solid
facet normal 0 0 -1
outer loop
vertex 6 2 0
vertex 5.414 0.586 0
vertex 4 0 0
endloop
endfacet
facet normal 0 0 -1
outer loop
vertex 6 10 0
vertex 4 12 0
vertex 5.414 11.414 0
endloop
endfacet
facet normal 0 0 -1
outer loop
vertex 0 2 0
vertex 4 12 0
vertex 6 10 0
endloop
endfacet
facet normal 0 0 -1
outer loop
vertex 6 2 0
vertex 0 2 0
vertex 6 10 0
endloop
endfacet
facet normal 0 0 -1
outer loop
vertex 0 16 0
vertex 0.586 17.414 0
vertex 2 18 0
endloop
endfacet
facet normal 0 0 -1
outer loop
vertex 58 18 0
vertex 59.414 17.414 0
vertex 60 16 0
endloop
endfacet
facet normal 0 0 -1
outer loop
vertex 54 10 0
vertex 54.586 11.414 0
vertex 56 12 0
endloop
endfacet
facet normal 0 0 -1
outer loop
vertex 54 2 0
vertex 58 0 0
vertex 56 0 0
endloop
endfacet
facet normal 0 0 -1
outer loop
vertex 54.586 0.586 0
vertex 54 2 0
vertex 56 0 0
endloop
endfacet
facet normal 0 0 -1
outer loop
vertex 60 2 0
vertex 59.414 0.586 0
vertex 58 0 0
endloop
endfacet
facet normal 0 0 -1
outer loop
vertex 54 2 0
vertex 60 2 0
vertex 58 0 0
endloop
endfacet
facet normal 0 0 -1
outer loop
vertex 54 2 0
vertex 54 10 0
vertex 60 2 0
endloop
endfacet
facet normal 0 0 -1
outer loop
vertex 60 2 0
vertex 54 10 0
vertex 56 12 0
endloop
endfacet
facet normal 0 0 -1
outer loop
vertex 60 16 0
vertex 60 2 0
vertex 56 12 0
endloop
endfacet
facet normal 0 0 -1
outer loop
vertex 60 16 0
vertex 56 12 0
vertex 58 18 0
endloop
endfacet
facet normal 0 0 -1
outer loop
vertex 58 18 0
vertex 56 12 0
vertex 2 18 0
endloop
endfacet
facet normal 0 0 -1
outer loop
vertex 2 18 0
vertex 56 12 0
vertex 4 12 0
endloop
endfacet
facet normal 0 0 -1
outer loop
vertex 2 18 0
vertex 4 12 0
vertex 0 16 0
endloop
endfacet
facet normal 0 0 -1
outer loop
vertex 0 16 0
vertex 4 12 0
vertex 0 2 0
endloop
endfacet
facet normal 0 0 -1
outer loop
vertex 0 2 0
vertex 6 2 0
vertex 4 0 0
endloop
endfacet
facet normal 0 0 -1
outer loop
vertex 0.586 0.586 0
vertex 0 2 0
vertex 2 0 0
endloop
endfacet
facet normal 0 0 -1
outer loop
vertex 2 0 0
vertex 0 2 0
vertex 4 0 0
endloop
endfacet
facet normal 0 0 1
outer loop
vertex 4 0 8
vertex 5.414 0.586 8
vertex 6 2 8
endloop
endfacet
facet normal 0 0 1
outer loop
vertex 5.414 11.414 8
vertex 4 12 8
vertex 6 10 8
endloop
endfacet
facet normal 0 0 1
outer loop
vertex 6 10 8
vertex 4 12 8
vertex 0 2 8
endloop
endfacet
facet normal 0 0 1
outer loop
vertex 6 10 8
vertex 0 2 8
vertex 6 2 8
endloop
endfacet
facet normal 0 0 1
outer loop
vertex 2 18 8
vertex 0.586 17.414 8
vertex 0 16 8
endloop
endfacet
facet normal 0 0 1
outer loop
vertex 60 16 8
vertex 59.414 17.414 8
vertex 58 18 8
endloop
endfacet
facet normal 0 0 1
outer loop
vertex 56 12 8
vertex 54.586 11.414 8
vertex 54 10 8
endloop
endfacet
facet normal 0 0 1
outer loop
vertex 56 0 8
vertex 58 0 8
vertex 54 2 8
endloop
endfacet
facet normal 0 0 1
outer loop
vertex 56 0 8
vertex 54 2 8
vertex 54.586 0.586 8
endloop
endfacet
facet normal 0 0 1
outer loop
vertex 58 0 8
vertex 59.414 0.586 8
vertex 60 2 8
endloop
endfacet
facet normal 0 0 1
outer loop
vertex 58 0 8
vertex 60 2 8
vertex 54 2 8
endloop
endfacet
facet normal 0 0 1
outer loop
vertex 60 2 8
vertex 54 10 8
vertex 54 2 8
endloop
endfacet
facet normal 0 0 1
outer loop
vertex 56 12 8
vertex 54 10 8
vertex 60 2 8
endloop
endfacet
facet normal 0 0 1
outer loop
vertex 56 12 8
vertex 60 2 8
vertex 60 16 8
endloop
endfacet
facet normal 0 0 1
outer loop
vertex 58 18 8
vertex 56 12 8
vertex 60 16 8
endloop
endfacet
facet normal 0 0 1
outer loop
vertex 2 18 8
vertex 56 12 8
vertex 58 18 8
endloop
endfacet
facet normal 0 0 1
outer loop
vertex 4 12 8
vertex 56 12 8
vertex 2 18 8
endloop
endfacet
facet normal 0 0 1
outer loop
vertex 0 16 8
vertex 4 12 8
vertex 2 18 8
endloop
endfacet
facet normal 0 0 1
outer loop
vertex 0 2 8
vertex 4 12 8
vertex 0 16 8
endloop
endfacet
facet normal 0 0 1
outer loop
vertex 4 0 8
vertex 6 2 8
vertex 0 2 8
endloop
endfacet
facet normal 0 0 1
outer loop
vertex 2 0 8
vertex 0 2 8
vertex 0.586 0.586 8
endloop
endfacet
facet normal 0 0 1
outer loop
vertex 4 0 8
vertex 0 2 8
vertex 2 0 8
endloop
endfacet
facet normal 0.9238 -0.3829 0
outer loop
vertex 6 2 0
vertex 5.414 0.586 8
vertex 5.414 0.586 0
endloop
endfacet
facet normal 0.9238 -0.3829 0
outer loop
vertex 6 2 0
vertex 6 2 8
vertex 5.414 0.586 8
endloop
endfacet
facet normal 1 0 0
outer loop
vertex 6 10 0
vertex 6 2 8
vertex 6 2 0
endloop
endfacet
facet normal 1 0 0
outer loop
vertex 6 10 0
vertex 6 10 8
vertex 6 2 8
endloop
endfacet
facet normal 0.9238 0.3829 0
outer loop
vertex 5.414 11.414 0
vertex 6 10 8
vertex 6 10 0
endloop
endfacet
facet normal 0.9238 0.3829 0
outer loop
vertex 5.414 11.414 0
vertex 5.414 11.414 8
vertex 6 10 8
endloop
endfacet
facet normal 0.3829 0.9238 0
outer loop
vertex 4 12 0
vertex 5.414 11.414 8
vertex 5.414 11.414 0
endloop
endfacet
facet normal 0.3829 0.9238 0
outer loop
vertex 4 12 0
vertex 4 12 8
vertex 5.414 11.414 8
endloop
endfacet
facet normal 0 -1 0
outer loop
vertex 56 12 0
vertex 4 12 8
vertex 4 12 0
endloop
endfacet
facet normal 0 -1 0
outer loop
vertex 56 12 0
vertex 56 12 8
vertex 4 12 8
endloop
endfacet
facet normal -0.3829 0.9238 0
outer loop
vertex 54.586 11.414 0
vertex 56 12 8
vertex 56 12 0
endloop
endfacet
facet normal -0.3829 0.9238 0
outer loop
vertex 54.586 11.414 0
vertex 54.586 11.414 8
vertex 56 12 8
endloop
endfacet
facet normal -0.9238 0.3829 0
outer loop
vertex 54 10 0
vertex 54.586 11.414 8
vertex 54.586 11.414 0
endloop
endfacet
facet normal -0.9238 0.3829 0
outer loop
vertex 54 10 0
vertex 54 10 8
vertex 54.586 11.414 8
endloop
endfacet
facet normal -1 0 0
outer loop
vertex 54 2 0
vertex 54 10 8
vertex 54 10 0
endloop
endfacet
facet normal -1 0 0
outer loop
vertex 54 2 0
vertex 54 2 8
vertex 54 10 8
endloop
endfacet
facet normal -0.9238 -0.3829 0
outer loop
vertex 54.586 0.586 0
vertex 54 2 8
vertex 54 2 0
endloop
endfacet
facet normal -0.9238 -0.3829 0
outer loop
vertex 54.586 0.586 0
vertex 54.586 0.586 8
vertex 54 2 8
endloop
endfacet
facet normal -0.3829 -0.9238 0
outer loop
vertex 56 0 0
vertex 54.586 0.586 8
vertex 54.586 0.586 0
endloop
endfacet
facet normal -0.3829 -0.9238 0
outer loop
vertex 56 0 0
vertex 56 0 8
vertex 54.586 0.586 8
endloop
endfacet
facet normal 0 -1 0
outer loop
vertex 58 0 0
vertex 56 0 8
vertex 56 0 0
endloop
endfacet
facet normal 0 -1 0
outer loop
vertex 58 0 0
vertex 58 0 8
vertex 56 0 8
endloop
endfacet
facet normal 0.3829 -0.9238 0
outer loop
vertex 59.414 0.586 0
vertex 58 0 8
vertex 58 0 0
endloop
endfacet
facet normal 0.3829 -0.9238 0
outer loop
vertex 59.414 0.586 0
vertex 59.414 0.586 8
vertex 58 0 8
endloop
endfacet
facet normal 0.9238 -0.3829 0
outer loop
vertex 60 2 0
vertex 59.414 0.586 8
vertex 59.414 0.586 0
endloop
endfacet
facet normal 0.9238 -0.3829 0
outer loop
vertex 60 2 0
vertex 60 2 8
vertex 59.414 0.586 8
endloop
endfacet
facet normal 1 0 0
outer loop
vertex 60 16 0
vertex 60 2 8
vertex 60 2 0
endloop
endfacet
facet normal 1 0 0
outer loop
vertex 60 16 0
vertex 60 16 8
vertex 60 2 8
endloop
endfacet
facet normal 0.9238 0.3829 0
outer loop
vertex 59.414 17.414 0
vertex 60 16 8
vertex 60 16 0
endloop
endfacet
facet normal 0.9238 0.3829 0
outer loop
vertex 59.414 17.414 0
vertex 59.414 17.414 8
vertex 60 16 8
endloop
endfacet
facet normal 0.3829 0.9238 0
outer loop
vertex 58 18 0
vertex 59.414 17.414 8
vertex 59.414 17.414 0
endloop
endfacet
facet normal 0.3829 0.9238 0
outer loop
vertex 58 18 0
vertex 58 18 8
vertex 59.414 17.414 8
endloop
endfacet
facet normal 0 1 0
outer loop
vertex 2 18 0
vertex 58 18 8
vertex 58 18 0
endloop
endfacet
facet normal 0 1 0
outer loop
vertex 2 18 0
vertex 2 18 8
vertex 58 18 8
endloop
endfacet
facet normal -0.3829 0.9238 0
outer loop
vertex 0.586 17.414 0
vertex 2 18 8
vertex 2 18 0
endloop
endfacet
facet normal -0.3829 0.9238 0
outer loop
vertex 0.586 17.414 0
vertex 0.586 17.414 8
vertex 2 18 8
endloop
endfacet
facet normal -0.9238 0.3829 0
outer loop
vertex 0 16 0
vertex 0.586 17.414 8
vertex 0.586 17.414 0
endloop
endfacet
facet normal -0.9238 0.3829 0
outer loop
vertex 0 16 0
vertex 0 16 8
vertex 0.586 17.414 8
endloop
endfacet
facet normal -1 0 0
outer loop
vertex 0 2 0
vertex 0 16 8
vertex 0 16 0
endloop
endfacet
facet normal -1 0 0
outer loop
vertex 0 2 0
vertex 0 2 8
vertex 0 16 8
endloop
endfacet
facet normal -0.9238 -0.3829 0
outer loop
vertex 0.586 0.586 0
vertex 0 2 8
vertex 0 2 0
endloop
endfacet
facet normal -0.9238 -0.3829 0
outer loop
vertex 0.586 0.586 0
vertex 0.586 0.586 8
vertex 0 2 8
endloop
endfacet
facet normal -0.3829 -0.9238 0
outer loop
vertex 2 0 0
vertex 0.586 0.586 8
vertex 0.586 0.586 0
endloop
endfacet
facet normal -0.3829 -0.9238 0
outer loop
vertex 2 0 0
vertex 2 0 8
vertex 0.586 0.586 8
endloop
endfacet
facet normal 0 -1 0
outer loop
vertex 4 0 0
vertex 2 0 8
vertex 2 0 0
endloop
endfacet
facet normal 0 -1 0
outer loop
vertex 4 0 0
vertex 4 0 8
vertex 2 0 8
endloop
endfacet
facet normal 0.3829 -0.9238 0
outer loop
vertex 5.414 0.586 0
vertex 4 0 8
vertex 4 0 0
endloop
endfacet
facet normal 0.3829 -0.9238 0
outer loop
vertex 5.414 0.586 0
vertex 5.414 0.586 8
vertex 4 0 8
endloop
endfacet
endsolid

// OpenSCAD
$fn = 32;

// ----------------------------------------------------------------------
// Clip blank: staple clip, 8 mm thick
// ----------------------------------------------------------------------

// --- parameters (mm) ---
profile_height = 8;       // extrusion height
profile_points = 24;      // points of the closed outline

profile = [[0, 2], [0.586, 0.586], [2, 0], [4, 0], [5.414, 0.586], [6, 2], [6, 10], [5.414, 11.414], [4, 12], [56, 12], [54.586, 11.414], [54, 10], [54, 2], [54.586, 0.586], [56, 0], [58, 0], [59.414, 0.586], [60, 2], [60, 16], [59.414, 17.414], [58, 18], [2, 18], [0.586, 17.414], [0, 16]];  // single closed polygon, 24 points, counter clockwise

// --- the one profile operation ---
linear_extrude(height = profile_height) polygon(points = profile);
